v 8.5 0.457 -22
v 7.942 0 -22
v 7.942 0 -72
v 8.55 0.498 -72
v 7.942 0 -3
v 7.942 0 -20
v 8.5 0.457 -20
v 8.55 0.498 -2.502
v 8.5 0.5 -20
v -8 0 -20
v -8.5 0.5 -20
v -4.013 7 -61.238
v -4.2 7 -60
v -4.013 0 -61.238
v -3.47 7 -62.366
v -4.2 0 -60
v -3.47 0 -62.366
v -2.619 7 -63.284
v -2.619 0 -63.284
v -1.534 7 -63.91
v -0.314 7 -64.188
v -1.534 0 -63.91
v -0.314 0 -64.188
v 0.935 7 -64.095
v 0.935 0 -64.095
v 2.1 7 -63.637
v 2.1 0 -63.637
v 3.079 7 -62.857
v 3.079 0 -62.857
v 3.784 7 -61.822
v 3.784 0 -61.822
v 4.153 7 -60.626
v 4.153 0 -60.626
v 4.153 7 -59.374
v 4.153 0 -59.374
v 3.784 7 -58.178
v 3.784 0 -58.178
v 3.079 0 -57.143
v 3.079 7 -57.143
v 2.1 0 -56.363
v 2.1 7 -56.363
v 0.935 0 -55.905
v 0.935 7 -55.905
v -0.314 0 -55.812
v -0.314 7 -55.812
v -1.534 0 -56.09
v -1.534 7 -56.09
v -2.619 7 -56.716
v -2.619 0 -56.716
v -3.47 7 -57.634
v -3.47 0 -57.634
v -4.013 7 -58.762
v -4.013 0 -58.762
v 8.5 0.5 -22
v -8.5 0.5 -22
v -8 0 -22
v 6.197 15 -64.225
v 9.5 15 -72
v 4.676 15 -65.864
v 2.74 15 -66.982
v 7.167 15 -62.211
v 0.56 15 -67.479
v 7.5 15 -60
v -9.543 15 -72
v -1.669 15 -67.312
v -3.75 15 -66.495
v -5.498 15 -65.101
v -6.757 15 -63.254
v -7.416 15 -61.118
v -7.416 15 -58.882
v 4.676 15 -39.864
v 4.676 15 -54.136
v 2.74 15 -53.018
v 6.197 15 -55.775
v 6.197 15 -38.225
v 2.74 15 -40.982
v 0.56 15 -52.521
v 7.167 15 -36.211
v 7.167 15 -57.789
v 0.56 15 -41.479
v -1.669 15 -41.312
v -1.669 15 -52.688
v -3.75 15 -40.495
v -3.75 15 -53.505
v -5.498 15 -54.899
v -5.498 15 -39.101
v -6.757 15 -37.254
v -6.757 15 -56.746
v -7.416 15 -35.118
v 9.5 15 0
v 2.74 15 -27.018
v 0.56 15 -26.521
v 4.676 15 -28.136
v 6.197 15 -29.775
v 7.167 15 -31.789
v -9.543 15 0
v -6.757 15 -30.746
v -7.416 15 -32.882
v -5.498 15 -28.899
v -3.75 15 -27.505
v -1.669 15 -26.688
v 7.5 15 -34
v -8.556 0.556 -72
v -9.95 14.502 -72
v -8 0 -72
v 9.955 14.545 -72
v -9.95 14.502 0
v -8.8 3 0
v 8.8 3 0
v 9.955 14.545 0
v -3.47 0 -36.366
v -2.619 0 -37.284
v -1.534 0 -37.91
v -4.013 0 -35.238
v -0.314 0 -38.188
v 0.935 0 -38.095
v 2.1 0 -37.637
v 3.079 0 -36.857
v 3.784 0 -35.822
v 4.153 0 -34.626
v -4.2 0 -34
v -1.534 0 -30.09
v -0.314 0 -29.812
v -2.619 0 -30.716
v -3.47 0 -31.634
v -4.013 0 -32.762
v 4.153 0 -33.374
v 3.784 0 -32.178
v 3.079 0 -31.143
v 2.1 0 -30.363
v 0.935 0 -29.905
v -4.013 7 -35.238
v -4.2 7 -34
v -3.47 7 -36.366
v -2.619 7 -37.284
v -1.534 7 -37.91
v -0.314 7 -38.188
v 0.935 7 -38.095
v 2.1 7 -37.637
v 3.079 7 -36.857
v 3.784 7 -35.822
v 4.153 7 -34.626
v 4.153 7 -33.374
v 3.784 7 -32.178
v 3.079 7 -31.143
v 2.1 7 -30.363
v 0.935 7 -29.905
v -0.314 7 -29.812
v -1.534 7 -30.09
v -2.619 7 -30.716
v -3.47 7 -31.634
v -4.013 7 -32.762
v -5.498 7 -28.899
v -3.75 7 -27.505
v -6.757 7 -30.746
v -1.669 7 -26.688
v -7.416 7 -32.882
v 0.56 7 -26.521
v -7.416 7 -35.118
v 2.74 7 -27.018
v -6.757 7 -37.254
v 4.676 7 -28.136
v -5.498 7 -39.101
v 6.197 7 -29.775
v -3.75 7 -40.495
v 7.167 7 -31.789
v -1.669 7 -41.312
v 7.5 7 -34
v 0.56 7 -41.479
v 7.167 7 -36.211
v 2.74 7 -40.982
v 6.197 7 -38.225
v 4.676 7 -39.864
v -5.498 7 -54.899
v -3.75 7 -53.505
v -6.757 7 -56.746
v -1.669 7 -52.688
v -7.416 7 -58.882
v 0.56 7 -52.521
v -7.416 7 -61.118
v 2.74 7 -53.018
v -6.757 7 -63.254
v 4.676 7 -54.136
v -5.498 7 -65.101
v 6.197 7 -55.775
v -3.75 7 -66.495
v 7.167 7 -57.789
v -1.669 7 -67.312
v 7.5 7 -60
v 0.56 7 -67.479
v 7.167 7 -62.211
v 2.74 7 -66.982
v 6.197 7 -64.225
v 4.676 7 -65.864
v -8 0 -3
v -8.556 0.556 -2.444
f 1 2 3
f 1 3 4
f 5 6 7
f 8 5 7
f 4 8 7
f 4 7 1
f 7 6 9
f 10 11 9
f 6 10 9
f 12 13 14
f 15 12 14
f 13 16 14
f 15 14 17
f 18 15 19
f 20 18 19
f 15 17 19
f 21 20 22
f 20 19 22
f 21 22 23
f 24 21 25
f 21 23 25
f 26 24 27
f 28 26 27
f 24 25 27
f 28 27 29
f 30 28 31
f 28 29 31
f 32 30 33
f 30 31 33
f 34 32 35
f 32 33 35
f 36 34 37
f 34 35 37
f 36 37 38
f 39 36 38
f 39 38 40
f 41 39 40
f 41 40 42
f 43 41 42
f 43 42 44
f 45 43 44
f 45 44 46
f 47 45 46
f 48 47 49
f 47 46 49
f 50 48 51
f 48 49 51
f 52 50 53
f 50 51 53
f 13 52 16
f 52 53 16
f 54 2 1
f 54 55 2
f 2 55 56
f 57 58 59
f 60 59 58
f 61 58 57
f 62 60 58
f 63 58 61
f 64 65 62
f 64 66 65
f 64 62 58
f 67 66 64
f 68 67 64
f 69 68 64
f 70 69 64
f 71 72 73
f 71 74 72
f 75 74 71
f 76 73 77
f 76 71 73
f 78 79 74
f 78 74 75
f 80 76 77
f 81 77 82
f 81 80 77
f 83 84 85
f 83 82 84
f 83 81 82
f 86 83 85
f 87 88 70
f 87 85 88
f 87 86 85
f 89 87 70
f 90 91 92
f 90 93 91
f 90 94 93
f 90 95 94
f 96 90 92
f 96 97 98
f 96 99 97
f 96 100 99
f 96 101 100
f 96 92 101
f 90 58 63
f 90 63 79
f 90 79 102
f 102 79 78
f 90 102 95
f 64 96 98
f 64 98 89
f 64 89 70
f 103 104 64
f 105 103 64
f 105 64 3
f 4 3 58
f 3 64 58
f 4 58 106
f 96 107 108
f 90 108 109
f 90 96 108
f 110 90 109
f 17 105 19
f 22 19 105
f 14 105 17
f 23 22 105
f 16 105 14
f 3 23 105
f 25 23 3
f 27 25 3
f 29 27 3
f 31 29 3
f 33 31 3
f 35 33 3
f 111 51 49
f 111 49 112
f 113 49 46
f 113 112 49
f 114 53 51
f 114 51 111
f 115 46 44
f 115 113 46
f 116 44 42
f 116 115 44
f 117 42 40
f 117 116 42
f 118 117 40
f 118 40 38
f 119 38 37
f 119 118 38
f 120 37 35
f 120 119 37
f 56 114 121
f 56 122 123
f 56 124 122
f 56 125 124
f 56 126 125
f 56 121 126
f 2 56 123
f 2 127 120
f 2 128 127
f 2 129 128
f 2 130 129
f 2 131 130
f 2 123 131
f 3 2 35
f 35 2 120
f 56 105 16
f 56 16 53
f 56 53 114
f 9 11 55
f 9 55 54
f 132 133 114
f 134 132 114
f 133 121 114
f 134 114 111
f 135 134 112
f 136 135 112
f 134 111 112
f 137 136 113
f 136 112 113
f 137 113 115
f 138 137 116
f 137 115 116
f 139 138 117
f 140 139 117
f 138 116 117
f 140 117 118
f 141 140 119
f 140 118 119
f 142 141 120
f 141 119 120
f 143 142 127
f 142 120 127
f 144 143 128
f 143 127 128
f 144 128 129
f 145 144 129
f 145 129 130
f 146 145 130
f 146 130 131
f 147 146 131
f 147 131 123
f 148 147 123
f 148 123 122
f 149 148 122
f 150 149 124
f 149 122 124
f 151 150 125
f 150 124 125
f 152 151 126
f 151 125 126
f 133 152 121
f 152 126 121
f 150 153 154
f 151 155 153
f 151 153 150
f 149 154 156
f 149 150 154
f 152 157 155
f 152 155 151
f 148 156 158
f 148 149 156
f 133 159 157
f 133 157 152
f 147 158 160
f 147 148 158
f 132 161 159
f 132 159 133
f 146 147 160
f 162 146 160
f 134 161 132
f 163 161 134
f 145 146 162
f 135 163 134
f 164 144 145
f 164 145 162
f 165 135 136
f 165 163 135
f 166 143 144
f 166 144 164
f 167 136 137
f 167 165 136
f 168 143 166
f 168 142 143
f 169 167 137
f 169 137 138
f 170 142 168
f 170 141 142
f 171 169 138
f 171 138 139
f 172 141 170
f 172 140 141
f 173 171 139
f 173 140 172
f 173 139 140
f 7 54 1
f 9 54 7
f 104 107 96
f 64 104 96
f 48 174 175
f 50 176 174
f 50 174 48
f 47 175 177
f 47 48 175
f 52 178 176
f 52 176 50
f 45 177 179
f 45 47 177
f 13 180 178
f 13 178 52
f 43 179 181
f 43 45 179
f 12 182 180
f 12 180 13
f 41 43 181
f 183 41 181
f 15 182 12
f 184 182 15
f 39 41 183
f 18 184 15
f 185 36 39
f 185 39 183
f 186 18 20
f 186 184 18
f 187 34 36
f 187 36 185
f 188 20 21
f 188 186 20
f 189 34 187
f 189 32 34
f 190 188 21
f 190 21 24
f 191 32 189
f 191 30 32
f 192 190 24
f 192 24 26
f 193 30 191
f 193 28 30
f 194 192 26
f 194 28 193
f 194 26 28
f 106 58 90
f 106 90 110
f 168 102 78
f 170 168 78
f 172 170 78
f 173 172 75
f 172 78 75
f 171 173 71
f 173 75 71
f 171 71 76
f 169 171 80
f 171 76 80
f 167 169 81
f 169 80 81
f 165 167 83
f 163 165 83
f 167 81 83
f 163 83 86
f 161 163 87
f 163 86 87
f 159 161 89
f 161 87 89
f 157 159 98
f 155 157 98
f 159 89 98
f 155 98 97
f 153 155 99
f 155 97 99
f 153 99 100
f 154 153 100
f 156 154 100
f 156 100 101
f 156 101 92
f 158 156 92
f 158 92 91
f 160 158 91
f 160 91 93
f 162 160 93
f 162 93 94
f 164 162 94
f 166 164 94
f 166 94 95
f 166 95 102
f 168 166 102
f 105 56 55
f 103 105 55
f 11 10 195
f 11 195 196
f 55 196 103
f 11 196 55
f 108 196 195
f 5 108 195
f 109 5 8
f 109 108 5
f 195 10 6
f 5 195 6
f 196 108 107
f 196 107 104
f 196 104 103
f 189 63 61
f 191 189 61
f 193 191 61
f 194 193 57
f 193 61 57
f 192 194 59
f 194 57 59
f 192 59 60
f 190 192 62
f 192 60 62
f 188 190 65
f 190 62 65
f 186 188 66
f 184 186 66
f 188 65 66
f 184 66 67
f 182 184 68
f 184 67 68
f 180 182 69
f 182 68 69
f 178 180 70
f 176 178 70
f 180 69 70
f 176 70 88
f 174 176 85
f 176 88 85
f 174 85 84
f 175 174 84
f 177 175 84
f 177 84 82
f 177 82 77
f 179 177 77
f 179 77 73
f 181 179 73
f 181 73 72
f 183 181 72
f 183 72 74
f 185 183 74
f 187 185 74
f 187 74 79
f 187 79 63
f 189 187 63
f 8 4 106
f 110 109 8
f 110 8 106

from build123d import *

# Parameters (mm, degrees)
EXTRUDE_1_DEPTH           = 72
CHAMFER_1_SIZE            = 3
CUT_EXTRUDE_1_DEPTH       = 75.222638056
CUT_EXTRUDE_1_DEPTH_BACK  = 0.5
SKETCH_2_W                = 17
SKETCH_2_H                = 2
HOLE_WIZARD_1_D           = 8.4
HOLE_WIZARD_1_CBORE_D     = 15
HOLE_WIZARD_1_CBORE_DEPTH = 8
CHAMFER_2_SIZE            = 0.5
CHAMFER_2_SIZE_2          = 0.558326423
CHAMFER_2_SIZE_3          = 0.456812528


with BuildPart() as part:
    # 草图1 → 凸台-拉伸1 (new body)
    with BuildSketch(Plane.XY):
        Polygon((-8.5, 0), (8.5, 0), (10, 15), (-10, 15), align=None)
    extrude(amount=-EXTRUDE_1_DEPTH)

    # 倒角1
    chamfer_1_edges = [part.edges().sort_by_distance(p)[0] for p in [
        (0, 0, 0),
    ]]
    chamfer(chamfer_1_edges, length=CHAMFER_1_SIZE)

    # 草图2 → 切除-拉伸-薄壁1 (cut, two sides: drawn at the far end of the back side and taken through both)
    with BuildSketch(Plane.XZ.offset(-CUT_EXTRUDE_1_DEPTH_BACK)):
        with Locations((0, -21)):
            Rectangle(SKETCH_2_W, SKETCH_2_H)
    extrude(amount=CUT_EXTRUDE_1_DEPTH + CUT_EXTRUDE_1_DEPTH_BACK, mode=Mode.SUBTRACT)

    # 孔1 (through all)
    with Locations(Plane(origin=(0, 15, 0), x_dir=(1, 0, 0), z_dir=(0, 1, 0))):
        with Locations((0, 34), (0, 60)):
            CounterBoreHole(HOLE_WIZARD_1_D / 2, HOLE_WIZARD_1_CBORE_D / 2, HOLE_WIZARD_1_CBORE_DEPTH)

    # 倒角2
    # the kernel refuses this chamfer: 0.558326423, 0.5, 0.456812528 mm, written as the material it takes off along each edge
    with BuildSketch(Plane(origin=(-8.5, 0, -1.560537605), x_dir=(0.9995316374096256, -0.030602382541768988, 0), z_dir=(0, 0, -1))) as chamfer_2_piece_1:
        Polygon((CHAMFER_2_SIZE * 0.99953163741, -CHAMFER_2_SIZE * 0.0306023825418), (-CHAMFER_2_SIZE_2 * 0.129907624032, -CHAMFER_2_SIZE_2 * 0.991526101843), (0, 0), align=None)
    extrude(amount=19.87892479, mode=Mode.SUBTRACT)
    with BuildSketch(Plane(origin=(8.5, 0, -1.560537605), x_dir=(-0.9996983211362673, -0.024561488499858487, 0), z_dir=(0, 0, -1))) as chamfer_2_piece_2:
        Polygon((CHAMFER_2_SIZE_2 * 0.999698321845, CHAMFER_2_SIZE_2 * 0.0245614885173), (-CHAMFER_2_SIZE * 0.123913295356, CHAMFER_2_SIZE * 0.992293049071), (0, 0), align=None)
    extrude(amount=19.87892479, mode=Mode.SUBTRACT)
    with BuildSketch(Plane(origin=(8.5, 0, -20.560537605), x_dir=(0.12990762393949729, 0.9915261011402545, 0), z_dir=(0, 0, -1))) as chamfer_2_piece_3:
        Polygon((CHAMFER_2_SIZE * 0.99953163741, -CHAMFER_2_SIZE * 0.0306023825418), (-CHAMFER_2_SIZE_2 * 0.129907624032, -CHAMFER_2_SIZE_2 * 0.991526101843), (0, 0), align=None)
    extrude(amount=52.87892479, mode=Mode.SUBTRACT)
    with BuildSketch(Plane(origin=(-8.5, 0, -20.560537605), x_dir=(-0.1239132953563816, 0.9922930490706474, 0), z_dir=(0, 0, -1))) as chamfer_2_piece_4:
        Polygon((CHAMFER_2_SIZE_2 * 0.999698321845, CHAMFER_2_SIZE_2 * 0.0245614885173), (-CHAMFER_2_SIZE * 0.123913295356, CHAMFER_2_SIZE * 0.992293049071), (0, 0), align=None)
    extrude(amount=52.87892479, mode=Mode.SUBTRACT)
    # the kernel refuses this chamfer: 0.558326423, 0.5, 0.456812528 mm, written as the material it takes off along each edge
    with BuildSketch(Plane(origin=(-10, 15, 1.285841494), x_dir=(0.07210667854261384, -0.9973969254562359, 0), z_dir=(0, 0, -1)), Plane(origin=(10, 15, 1.285841494), x_dir=(-0.9996219169112968, 0.027495876610585647, 0), z_dir=(0, 0, -1))) as chamfer_2_2_piece_1:
        Polygon((CHAMFER_2_SIZE * 0.999621916911, -CHAMFER_2_SIZE * 0.0274958766106), (CHAMFER_2_SIZE_3 * 0.0721066785794, -CHAMFER_2_SIZE_3 * 0.997396925964), (0, 0), align=None)
    extrude(amount=74.571682988, mode=Mode.SUBTRACT)


solid = part.part
